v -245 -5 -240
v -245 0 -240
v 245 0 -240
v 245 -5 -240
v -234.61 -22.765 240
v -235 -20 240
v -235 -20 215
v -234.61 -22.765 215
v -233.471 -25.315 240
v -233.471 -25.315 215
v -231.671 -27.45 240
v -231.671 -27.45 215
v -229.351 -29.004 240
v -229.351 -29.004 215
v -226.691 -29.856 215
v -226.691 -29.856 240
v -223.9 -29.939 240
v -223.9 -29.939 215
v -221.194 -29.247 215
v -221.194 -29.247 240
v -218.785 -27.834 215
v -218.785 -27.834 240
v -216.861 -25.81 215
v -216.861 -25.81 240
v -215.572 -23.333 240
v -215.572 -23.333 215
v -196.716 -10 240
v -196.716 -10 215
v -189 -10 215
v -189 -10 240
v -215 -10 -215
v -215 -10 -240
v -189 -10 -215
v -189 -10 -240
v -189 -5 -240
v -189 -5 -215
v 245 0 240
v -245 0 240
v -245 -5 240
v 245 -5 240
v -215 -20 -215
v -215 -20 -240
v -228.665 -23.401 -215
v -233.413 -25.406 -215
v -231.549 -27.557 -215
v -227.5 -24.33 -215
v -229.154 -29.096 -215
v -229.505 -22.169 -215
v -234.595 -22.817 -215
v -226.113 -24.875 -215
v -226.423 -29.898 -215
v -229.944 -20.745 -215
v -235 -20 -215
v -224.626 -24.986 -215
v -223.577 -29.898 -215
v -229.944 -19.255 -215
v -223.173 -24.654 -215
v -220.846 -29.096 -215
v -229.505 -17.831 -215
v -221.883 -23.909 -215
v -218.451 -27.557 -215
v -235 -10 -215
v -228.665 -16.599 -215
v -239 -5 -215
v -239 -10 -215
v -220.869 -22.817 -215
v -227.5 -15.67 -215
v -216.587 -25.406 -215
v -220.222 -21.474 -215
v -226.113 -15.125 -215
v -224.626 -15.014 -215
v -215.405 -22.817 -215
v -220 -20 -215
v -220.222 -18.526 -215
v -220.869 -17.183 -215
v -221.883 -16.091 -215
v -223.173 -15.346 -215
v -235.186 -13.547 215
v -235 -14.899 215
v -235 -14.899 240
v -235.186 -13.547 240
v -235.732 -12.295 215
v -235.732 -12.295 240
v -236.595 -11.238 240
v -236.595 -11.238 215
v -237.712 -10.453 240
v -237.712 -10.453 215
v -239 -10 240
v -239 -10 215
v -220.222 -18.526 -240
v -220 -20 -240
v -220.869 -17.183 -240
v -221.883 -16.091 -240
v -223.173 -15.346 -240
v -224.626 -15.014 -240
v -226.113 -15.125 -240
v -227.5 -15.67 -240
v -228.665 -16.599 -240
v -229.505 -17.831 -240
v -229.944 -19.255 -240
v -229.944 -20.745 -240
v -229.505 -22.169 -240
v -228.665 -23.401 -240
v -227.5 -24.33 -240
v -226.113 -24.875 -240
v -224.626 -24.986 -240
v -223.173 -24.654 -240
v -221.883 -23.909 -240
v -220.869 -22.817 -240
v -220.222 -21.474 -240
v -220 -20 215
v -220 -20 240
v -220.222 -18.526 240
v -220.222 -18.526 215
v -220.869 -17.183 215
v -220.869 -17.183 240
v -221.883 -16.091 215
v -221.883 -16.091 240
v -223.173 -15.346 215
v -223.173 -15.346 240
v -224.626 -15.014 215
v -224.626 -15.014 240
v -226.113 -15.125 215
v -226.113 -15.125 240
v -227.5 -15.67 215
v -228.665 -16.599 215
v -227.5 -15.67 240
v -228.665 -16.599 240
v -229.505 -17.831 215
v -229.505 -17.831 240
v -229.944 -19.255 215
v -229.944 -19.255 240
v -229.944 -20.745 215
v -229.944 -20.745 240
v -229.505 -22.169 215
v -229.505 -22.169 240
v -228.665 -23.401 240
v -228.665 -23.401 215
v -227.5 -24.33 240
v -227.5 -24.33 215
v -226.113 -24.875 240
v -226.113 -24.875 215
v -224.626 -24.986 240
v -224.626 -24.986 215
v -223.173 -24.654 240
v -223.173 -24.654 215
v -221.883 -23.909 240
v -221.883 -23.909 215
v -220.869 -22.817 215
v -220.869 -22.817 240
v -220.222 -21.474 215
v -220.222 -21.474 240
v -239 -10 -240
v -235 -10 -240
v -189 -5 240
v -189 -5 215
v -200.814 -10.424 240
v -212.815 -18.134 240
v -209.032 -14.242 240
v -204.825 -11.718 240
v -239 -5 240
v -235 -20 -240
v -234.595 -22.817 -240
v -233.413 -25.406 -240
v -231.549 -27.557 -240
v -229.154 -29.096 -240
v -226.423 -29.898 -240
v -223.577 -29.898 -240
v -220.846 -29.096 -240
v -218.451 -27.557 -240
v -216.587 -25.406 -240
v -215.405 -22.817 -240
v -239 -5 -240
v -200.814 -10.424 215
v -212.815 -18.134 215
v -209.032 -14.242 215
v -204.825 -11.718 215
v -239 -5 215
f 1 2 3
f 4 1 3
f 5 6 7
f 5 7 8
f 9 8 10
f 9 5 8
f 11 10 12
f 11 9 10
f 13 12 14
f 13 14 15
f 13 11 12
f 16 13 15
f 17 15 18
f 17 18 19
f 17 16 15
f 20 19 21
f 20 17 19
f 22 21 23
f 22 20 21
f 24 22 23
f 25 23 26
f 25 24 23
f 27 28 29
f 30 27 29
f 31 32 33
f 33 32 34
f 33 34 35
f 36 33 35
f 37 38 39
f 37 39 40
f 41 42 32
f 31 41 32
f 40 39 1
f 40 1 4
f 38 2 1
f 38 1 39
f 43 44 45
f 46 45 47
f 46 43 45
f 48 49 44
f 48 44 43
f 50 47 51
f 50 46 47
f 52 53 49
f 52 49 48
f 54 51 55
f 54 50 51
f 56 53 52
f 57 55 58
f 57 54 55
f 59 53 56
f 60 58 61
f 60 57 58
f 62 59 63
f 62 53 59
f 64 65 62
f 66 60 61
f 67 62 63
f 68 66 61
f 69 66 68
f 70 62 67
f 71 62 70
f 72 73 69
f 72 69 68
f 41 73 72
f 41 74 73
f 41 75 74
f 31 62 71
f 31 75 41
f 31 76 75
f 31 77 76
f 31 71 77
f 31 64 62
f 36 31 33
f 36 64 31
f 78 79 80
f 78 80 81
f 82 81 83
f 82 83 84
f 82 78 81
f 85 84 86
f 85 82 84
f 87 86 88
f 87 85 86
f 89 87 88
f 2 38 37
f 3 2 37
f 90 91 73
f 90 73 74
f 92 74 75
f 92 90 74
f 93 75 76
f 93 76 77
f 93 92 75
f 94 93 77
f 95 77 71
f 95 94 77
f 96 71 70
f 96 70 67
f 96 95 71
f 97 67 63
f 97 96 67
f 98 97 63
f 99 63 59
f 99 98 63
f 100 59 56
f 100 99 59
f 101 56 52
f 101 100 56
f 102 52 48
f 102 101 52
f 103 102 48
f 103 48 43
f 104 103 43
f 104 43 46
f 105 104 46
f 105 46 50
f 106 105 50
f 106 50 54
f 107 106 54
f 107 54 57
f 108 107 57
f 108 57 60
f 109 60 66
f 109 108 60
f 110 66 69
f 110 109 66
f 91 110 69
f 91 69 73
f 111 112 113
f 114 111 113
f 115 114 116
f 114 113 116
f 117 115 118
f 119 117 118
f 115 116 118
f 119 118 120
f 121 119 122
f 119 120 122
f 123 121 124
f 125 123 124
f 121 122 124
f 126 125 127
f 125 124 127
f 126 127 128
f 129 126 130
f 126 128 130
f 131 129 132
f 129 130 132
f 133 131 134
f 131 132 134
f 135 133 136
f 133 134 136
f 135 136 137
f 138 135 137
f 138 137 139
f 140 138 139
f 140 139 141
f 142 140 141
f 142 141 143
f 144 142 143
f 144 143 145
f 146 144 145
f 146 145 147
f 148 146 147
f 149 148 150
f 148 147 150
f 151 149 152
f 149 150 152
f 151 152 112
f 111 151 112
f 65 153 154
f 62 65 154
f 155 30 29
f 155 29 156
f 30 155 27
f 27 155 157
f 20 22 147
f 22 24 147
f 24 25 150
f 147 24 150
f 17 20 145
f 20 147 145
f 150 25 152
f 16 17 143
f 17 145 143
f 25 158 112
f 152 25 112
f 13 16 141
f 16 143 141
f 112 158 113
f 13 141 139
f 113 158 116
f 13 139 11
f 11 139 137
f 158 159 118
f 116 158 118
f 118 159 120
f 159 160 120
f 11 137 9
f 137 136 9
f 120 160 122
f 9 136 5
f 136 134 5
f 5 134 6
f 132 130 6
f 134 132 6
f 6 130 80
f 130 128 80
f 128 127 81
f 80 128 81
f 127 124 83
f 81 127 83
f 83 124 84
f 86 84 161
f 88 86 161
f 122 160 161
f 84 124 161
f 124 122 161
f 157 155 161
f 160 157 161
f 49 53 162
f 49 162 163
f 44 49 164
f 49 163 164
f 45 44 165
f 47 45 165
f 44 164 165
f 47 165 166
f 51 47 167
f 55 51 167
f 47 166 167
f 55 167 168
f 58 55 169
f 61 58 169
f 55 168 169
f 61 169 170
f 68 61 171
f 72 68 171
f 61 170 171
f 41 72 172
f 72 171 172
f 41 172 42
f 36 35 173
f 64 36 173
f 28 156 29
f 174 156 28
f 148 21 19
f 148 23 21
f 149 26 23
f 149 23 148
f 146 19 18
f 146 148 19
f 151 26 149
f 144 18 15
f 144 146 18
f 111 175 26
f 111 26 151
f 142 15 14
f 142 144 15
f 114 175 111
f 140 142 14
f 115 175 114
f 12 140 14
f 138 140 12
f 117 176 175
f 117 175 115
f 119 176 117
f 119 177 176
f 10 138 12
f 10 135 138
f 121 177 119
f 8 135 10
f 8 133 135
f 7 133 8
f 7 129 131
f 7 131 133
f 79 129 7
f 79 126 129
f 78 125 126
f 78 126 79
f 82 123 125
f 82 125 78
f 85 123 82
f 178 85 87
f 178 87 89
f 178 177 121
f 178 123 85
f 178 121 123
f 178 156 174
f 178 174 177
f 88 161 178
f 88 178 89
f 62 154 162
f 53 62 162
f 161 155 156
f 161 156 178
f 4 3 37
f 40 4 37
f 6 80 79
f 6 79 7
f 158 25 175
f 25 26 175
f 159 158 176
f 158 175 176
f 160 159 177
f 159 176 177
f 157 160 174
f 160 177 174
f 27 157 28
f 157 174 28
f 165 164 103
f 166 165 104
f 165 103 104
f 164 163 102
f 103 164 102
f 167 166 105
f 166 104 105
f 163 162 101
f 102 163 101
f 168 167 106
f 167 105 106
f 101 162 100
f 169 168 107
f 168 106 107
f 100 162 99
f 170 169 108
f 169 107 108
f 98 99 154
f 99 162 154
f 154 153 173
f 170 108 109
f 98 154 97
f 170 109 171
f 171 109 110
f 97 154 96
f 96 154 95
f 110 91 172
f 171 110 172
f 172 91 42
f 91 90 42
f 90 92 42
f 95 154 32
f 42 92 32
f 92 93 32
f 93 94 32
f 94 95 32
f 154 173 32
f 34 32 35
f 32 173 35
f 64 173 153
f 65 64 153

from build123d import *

# Parameters (mm, degrees)
F0_W        = 490
F0_H        = 480
F1_DEPTH    = 5
F2_R        = 5
F3_DEPTH    = 25
F6_R        = 20
F7_T1_DEPTH = 25


# Not quite as in the source:
# - a fillet or chamfer that OpenCascade refuses, or shapes differently, is made with other operations: its cross-section is extruded or revolved along the edge and cut away or added


with BuildPart() as f1:
    # F0 (on Front) → F1 (new body)
    with BuildSketch(Plane.XZ):
        Rectangle(F0_W, F0_H)
    extrude(amount=F1_DEPTH)


with BuildPart() as f3:
    # F2 (on face) → F3 (new body)
    with BuildSketch(Plane.XY.offset(240)):
        Polygon((-189, -10), (-189, -5), (-239, -5), (-239, -10), (-235, -10), (-225, -10), (-215, -10), align=None)
        with BuildLine():
            ThreePointArc((-215, -20), (-217.9289321881, -12.9289321881), (-225, -10))
            ThreePointArc((-225, -10), (-232.0710678119, -12.9289321881), (-235, -20))
            ThreePointArc((-235, -20), (-225, -30), (-215, -20))
        make_face()
        with Locations((-225, -20)):
            Circle(F2_R, mode=Mode.SUBTRACT)
        with BuildLine():
            Line((-215, -20), (-215, -10))
            Line((-215, -10), (-225, -10))
            ThreePointArc((-225, -10), (-217.9289321881, -12.9289321881), (-215, -20))
        make_face()
        with BuildLine():
            Line((-225, -10), (-235, -10))
            Line((-235, -10), (-235, -20))
            ThreePointArc((-235, -20), (-232.0710678119, -12.9289321881), (-225, -10))
        make_face()
    extrude(amount=-F3_DEPTH)


with BuildPart() as f4_1:
    # F4: instance of F3
    add(f3.part.mirror(Plane.XY))


with BuildPart() as f3_1:
    add(f3.part)

    # F6
    f6_edges = [f3_1.edges().sort_by_distance(p)[0] for p in [
        (-215, -10, 227.5),
    ]]
    fillet(f6_edges, radius=F6_R)

    # F7: fillet of radius 5 on 1 edges, made by hand

    # F7_s2 → F7_t1 (join)
    with BuildSketch(Plane.XY.offset(215)):
        with BuildLine():
            ThreePointArc((-235, -14.8989794856), (-236.1270166538, -11.7367018254), (-239, -10))
            Line((-239, -10), (-235, -10))
            Line((-235, -10), (-235, -14.8989794856))
        make_face()
    extrude(amount=F7_T1_DEPTH)


solid = Compound([f1.part, f4_1.part, f3_1.part])
